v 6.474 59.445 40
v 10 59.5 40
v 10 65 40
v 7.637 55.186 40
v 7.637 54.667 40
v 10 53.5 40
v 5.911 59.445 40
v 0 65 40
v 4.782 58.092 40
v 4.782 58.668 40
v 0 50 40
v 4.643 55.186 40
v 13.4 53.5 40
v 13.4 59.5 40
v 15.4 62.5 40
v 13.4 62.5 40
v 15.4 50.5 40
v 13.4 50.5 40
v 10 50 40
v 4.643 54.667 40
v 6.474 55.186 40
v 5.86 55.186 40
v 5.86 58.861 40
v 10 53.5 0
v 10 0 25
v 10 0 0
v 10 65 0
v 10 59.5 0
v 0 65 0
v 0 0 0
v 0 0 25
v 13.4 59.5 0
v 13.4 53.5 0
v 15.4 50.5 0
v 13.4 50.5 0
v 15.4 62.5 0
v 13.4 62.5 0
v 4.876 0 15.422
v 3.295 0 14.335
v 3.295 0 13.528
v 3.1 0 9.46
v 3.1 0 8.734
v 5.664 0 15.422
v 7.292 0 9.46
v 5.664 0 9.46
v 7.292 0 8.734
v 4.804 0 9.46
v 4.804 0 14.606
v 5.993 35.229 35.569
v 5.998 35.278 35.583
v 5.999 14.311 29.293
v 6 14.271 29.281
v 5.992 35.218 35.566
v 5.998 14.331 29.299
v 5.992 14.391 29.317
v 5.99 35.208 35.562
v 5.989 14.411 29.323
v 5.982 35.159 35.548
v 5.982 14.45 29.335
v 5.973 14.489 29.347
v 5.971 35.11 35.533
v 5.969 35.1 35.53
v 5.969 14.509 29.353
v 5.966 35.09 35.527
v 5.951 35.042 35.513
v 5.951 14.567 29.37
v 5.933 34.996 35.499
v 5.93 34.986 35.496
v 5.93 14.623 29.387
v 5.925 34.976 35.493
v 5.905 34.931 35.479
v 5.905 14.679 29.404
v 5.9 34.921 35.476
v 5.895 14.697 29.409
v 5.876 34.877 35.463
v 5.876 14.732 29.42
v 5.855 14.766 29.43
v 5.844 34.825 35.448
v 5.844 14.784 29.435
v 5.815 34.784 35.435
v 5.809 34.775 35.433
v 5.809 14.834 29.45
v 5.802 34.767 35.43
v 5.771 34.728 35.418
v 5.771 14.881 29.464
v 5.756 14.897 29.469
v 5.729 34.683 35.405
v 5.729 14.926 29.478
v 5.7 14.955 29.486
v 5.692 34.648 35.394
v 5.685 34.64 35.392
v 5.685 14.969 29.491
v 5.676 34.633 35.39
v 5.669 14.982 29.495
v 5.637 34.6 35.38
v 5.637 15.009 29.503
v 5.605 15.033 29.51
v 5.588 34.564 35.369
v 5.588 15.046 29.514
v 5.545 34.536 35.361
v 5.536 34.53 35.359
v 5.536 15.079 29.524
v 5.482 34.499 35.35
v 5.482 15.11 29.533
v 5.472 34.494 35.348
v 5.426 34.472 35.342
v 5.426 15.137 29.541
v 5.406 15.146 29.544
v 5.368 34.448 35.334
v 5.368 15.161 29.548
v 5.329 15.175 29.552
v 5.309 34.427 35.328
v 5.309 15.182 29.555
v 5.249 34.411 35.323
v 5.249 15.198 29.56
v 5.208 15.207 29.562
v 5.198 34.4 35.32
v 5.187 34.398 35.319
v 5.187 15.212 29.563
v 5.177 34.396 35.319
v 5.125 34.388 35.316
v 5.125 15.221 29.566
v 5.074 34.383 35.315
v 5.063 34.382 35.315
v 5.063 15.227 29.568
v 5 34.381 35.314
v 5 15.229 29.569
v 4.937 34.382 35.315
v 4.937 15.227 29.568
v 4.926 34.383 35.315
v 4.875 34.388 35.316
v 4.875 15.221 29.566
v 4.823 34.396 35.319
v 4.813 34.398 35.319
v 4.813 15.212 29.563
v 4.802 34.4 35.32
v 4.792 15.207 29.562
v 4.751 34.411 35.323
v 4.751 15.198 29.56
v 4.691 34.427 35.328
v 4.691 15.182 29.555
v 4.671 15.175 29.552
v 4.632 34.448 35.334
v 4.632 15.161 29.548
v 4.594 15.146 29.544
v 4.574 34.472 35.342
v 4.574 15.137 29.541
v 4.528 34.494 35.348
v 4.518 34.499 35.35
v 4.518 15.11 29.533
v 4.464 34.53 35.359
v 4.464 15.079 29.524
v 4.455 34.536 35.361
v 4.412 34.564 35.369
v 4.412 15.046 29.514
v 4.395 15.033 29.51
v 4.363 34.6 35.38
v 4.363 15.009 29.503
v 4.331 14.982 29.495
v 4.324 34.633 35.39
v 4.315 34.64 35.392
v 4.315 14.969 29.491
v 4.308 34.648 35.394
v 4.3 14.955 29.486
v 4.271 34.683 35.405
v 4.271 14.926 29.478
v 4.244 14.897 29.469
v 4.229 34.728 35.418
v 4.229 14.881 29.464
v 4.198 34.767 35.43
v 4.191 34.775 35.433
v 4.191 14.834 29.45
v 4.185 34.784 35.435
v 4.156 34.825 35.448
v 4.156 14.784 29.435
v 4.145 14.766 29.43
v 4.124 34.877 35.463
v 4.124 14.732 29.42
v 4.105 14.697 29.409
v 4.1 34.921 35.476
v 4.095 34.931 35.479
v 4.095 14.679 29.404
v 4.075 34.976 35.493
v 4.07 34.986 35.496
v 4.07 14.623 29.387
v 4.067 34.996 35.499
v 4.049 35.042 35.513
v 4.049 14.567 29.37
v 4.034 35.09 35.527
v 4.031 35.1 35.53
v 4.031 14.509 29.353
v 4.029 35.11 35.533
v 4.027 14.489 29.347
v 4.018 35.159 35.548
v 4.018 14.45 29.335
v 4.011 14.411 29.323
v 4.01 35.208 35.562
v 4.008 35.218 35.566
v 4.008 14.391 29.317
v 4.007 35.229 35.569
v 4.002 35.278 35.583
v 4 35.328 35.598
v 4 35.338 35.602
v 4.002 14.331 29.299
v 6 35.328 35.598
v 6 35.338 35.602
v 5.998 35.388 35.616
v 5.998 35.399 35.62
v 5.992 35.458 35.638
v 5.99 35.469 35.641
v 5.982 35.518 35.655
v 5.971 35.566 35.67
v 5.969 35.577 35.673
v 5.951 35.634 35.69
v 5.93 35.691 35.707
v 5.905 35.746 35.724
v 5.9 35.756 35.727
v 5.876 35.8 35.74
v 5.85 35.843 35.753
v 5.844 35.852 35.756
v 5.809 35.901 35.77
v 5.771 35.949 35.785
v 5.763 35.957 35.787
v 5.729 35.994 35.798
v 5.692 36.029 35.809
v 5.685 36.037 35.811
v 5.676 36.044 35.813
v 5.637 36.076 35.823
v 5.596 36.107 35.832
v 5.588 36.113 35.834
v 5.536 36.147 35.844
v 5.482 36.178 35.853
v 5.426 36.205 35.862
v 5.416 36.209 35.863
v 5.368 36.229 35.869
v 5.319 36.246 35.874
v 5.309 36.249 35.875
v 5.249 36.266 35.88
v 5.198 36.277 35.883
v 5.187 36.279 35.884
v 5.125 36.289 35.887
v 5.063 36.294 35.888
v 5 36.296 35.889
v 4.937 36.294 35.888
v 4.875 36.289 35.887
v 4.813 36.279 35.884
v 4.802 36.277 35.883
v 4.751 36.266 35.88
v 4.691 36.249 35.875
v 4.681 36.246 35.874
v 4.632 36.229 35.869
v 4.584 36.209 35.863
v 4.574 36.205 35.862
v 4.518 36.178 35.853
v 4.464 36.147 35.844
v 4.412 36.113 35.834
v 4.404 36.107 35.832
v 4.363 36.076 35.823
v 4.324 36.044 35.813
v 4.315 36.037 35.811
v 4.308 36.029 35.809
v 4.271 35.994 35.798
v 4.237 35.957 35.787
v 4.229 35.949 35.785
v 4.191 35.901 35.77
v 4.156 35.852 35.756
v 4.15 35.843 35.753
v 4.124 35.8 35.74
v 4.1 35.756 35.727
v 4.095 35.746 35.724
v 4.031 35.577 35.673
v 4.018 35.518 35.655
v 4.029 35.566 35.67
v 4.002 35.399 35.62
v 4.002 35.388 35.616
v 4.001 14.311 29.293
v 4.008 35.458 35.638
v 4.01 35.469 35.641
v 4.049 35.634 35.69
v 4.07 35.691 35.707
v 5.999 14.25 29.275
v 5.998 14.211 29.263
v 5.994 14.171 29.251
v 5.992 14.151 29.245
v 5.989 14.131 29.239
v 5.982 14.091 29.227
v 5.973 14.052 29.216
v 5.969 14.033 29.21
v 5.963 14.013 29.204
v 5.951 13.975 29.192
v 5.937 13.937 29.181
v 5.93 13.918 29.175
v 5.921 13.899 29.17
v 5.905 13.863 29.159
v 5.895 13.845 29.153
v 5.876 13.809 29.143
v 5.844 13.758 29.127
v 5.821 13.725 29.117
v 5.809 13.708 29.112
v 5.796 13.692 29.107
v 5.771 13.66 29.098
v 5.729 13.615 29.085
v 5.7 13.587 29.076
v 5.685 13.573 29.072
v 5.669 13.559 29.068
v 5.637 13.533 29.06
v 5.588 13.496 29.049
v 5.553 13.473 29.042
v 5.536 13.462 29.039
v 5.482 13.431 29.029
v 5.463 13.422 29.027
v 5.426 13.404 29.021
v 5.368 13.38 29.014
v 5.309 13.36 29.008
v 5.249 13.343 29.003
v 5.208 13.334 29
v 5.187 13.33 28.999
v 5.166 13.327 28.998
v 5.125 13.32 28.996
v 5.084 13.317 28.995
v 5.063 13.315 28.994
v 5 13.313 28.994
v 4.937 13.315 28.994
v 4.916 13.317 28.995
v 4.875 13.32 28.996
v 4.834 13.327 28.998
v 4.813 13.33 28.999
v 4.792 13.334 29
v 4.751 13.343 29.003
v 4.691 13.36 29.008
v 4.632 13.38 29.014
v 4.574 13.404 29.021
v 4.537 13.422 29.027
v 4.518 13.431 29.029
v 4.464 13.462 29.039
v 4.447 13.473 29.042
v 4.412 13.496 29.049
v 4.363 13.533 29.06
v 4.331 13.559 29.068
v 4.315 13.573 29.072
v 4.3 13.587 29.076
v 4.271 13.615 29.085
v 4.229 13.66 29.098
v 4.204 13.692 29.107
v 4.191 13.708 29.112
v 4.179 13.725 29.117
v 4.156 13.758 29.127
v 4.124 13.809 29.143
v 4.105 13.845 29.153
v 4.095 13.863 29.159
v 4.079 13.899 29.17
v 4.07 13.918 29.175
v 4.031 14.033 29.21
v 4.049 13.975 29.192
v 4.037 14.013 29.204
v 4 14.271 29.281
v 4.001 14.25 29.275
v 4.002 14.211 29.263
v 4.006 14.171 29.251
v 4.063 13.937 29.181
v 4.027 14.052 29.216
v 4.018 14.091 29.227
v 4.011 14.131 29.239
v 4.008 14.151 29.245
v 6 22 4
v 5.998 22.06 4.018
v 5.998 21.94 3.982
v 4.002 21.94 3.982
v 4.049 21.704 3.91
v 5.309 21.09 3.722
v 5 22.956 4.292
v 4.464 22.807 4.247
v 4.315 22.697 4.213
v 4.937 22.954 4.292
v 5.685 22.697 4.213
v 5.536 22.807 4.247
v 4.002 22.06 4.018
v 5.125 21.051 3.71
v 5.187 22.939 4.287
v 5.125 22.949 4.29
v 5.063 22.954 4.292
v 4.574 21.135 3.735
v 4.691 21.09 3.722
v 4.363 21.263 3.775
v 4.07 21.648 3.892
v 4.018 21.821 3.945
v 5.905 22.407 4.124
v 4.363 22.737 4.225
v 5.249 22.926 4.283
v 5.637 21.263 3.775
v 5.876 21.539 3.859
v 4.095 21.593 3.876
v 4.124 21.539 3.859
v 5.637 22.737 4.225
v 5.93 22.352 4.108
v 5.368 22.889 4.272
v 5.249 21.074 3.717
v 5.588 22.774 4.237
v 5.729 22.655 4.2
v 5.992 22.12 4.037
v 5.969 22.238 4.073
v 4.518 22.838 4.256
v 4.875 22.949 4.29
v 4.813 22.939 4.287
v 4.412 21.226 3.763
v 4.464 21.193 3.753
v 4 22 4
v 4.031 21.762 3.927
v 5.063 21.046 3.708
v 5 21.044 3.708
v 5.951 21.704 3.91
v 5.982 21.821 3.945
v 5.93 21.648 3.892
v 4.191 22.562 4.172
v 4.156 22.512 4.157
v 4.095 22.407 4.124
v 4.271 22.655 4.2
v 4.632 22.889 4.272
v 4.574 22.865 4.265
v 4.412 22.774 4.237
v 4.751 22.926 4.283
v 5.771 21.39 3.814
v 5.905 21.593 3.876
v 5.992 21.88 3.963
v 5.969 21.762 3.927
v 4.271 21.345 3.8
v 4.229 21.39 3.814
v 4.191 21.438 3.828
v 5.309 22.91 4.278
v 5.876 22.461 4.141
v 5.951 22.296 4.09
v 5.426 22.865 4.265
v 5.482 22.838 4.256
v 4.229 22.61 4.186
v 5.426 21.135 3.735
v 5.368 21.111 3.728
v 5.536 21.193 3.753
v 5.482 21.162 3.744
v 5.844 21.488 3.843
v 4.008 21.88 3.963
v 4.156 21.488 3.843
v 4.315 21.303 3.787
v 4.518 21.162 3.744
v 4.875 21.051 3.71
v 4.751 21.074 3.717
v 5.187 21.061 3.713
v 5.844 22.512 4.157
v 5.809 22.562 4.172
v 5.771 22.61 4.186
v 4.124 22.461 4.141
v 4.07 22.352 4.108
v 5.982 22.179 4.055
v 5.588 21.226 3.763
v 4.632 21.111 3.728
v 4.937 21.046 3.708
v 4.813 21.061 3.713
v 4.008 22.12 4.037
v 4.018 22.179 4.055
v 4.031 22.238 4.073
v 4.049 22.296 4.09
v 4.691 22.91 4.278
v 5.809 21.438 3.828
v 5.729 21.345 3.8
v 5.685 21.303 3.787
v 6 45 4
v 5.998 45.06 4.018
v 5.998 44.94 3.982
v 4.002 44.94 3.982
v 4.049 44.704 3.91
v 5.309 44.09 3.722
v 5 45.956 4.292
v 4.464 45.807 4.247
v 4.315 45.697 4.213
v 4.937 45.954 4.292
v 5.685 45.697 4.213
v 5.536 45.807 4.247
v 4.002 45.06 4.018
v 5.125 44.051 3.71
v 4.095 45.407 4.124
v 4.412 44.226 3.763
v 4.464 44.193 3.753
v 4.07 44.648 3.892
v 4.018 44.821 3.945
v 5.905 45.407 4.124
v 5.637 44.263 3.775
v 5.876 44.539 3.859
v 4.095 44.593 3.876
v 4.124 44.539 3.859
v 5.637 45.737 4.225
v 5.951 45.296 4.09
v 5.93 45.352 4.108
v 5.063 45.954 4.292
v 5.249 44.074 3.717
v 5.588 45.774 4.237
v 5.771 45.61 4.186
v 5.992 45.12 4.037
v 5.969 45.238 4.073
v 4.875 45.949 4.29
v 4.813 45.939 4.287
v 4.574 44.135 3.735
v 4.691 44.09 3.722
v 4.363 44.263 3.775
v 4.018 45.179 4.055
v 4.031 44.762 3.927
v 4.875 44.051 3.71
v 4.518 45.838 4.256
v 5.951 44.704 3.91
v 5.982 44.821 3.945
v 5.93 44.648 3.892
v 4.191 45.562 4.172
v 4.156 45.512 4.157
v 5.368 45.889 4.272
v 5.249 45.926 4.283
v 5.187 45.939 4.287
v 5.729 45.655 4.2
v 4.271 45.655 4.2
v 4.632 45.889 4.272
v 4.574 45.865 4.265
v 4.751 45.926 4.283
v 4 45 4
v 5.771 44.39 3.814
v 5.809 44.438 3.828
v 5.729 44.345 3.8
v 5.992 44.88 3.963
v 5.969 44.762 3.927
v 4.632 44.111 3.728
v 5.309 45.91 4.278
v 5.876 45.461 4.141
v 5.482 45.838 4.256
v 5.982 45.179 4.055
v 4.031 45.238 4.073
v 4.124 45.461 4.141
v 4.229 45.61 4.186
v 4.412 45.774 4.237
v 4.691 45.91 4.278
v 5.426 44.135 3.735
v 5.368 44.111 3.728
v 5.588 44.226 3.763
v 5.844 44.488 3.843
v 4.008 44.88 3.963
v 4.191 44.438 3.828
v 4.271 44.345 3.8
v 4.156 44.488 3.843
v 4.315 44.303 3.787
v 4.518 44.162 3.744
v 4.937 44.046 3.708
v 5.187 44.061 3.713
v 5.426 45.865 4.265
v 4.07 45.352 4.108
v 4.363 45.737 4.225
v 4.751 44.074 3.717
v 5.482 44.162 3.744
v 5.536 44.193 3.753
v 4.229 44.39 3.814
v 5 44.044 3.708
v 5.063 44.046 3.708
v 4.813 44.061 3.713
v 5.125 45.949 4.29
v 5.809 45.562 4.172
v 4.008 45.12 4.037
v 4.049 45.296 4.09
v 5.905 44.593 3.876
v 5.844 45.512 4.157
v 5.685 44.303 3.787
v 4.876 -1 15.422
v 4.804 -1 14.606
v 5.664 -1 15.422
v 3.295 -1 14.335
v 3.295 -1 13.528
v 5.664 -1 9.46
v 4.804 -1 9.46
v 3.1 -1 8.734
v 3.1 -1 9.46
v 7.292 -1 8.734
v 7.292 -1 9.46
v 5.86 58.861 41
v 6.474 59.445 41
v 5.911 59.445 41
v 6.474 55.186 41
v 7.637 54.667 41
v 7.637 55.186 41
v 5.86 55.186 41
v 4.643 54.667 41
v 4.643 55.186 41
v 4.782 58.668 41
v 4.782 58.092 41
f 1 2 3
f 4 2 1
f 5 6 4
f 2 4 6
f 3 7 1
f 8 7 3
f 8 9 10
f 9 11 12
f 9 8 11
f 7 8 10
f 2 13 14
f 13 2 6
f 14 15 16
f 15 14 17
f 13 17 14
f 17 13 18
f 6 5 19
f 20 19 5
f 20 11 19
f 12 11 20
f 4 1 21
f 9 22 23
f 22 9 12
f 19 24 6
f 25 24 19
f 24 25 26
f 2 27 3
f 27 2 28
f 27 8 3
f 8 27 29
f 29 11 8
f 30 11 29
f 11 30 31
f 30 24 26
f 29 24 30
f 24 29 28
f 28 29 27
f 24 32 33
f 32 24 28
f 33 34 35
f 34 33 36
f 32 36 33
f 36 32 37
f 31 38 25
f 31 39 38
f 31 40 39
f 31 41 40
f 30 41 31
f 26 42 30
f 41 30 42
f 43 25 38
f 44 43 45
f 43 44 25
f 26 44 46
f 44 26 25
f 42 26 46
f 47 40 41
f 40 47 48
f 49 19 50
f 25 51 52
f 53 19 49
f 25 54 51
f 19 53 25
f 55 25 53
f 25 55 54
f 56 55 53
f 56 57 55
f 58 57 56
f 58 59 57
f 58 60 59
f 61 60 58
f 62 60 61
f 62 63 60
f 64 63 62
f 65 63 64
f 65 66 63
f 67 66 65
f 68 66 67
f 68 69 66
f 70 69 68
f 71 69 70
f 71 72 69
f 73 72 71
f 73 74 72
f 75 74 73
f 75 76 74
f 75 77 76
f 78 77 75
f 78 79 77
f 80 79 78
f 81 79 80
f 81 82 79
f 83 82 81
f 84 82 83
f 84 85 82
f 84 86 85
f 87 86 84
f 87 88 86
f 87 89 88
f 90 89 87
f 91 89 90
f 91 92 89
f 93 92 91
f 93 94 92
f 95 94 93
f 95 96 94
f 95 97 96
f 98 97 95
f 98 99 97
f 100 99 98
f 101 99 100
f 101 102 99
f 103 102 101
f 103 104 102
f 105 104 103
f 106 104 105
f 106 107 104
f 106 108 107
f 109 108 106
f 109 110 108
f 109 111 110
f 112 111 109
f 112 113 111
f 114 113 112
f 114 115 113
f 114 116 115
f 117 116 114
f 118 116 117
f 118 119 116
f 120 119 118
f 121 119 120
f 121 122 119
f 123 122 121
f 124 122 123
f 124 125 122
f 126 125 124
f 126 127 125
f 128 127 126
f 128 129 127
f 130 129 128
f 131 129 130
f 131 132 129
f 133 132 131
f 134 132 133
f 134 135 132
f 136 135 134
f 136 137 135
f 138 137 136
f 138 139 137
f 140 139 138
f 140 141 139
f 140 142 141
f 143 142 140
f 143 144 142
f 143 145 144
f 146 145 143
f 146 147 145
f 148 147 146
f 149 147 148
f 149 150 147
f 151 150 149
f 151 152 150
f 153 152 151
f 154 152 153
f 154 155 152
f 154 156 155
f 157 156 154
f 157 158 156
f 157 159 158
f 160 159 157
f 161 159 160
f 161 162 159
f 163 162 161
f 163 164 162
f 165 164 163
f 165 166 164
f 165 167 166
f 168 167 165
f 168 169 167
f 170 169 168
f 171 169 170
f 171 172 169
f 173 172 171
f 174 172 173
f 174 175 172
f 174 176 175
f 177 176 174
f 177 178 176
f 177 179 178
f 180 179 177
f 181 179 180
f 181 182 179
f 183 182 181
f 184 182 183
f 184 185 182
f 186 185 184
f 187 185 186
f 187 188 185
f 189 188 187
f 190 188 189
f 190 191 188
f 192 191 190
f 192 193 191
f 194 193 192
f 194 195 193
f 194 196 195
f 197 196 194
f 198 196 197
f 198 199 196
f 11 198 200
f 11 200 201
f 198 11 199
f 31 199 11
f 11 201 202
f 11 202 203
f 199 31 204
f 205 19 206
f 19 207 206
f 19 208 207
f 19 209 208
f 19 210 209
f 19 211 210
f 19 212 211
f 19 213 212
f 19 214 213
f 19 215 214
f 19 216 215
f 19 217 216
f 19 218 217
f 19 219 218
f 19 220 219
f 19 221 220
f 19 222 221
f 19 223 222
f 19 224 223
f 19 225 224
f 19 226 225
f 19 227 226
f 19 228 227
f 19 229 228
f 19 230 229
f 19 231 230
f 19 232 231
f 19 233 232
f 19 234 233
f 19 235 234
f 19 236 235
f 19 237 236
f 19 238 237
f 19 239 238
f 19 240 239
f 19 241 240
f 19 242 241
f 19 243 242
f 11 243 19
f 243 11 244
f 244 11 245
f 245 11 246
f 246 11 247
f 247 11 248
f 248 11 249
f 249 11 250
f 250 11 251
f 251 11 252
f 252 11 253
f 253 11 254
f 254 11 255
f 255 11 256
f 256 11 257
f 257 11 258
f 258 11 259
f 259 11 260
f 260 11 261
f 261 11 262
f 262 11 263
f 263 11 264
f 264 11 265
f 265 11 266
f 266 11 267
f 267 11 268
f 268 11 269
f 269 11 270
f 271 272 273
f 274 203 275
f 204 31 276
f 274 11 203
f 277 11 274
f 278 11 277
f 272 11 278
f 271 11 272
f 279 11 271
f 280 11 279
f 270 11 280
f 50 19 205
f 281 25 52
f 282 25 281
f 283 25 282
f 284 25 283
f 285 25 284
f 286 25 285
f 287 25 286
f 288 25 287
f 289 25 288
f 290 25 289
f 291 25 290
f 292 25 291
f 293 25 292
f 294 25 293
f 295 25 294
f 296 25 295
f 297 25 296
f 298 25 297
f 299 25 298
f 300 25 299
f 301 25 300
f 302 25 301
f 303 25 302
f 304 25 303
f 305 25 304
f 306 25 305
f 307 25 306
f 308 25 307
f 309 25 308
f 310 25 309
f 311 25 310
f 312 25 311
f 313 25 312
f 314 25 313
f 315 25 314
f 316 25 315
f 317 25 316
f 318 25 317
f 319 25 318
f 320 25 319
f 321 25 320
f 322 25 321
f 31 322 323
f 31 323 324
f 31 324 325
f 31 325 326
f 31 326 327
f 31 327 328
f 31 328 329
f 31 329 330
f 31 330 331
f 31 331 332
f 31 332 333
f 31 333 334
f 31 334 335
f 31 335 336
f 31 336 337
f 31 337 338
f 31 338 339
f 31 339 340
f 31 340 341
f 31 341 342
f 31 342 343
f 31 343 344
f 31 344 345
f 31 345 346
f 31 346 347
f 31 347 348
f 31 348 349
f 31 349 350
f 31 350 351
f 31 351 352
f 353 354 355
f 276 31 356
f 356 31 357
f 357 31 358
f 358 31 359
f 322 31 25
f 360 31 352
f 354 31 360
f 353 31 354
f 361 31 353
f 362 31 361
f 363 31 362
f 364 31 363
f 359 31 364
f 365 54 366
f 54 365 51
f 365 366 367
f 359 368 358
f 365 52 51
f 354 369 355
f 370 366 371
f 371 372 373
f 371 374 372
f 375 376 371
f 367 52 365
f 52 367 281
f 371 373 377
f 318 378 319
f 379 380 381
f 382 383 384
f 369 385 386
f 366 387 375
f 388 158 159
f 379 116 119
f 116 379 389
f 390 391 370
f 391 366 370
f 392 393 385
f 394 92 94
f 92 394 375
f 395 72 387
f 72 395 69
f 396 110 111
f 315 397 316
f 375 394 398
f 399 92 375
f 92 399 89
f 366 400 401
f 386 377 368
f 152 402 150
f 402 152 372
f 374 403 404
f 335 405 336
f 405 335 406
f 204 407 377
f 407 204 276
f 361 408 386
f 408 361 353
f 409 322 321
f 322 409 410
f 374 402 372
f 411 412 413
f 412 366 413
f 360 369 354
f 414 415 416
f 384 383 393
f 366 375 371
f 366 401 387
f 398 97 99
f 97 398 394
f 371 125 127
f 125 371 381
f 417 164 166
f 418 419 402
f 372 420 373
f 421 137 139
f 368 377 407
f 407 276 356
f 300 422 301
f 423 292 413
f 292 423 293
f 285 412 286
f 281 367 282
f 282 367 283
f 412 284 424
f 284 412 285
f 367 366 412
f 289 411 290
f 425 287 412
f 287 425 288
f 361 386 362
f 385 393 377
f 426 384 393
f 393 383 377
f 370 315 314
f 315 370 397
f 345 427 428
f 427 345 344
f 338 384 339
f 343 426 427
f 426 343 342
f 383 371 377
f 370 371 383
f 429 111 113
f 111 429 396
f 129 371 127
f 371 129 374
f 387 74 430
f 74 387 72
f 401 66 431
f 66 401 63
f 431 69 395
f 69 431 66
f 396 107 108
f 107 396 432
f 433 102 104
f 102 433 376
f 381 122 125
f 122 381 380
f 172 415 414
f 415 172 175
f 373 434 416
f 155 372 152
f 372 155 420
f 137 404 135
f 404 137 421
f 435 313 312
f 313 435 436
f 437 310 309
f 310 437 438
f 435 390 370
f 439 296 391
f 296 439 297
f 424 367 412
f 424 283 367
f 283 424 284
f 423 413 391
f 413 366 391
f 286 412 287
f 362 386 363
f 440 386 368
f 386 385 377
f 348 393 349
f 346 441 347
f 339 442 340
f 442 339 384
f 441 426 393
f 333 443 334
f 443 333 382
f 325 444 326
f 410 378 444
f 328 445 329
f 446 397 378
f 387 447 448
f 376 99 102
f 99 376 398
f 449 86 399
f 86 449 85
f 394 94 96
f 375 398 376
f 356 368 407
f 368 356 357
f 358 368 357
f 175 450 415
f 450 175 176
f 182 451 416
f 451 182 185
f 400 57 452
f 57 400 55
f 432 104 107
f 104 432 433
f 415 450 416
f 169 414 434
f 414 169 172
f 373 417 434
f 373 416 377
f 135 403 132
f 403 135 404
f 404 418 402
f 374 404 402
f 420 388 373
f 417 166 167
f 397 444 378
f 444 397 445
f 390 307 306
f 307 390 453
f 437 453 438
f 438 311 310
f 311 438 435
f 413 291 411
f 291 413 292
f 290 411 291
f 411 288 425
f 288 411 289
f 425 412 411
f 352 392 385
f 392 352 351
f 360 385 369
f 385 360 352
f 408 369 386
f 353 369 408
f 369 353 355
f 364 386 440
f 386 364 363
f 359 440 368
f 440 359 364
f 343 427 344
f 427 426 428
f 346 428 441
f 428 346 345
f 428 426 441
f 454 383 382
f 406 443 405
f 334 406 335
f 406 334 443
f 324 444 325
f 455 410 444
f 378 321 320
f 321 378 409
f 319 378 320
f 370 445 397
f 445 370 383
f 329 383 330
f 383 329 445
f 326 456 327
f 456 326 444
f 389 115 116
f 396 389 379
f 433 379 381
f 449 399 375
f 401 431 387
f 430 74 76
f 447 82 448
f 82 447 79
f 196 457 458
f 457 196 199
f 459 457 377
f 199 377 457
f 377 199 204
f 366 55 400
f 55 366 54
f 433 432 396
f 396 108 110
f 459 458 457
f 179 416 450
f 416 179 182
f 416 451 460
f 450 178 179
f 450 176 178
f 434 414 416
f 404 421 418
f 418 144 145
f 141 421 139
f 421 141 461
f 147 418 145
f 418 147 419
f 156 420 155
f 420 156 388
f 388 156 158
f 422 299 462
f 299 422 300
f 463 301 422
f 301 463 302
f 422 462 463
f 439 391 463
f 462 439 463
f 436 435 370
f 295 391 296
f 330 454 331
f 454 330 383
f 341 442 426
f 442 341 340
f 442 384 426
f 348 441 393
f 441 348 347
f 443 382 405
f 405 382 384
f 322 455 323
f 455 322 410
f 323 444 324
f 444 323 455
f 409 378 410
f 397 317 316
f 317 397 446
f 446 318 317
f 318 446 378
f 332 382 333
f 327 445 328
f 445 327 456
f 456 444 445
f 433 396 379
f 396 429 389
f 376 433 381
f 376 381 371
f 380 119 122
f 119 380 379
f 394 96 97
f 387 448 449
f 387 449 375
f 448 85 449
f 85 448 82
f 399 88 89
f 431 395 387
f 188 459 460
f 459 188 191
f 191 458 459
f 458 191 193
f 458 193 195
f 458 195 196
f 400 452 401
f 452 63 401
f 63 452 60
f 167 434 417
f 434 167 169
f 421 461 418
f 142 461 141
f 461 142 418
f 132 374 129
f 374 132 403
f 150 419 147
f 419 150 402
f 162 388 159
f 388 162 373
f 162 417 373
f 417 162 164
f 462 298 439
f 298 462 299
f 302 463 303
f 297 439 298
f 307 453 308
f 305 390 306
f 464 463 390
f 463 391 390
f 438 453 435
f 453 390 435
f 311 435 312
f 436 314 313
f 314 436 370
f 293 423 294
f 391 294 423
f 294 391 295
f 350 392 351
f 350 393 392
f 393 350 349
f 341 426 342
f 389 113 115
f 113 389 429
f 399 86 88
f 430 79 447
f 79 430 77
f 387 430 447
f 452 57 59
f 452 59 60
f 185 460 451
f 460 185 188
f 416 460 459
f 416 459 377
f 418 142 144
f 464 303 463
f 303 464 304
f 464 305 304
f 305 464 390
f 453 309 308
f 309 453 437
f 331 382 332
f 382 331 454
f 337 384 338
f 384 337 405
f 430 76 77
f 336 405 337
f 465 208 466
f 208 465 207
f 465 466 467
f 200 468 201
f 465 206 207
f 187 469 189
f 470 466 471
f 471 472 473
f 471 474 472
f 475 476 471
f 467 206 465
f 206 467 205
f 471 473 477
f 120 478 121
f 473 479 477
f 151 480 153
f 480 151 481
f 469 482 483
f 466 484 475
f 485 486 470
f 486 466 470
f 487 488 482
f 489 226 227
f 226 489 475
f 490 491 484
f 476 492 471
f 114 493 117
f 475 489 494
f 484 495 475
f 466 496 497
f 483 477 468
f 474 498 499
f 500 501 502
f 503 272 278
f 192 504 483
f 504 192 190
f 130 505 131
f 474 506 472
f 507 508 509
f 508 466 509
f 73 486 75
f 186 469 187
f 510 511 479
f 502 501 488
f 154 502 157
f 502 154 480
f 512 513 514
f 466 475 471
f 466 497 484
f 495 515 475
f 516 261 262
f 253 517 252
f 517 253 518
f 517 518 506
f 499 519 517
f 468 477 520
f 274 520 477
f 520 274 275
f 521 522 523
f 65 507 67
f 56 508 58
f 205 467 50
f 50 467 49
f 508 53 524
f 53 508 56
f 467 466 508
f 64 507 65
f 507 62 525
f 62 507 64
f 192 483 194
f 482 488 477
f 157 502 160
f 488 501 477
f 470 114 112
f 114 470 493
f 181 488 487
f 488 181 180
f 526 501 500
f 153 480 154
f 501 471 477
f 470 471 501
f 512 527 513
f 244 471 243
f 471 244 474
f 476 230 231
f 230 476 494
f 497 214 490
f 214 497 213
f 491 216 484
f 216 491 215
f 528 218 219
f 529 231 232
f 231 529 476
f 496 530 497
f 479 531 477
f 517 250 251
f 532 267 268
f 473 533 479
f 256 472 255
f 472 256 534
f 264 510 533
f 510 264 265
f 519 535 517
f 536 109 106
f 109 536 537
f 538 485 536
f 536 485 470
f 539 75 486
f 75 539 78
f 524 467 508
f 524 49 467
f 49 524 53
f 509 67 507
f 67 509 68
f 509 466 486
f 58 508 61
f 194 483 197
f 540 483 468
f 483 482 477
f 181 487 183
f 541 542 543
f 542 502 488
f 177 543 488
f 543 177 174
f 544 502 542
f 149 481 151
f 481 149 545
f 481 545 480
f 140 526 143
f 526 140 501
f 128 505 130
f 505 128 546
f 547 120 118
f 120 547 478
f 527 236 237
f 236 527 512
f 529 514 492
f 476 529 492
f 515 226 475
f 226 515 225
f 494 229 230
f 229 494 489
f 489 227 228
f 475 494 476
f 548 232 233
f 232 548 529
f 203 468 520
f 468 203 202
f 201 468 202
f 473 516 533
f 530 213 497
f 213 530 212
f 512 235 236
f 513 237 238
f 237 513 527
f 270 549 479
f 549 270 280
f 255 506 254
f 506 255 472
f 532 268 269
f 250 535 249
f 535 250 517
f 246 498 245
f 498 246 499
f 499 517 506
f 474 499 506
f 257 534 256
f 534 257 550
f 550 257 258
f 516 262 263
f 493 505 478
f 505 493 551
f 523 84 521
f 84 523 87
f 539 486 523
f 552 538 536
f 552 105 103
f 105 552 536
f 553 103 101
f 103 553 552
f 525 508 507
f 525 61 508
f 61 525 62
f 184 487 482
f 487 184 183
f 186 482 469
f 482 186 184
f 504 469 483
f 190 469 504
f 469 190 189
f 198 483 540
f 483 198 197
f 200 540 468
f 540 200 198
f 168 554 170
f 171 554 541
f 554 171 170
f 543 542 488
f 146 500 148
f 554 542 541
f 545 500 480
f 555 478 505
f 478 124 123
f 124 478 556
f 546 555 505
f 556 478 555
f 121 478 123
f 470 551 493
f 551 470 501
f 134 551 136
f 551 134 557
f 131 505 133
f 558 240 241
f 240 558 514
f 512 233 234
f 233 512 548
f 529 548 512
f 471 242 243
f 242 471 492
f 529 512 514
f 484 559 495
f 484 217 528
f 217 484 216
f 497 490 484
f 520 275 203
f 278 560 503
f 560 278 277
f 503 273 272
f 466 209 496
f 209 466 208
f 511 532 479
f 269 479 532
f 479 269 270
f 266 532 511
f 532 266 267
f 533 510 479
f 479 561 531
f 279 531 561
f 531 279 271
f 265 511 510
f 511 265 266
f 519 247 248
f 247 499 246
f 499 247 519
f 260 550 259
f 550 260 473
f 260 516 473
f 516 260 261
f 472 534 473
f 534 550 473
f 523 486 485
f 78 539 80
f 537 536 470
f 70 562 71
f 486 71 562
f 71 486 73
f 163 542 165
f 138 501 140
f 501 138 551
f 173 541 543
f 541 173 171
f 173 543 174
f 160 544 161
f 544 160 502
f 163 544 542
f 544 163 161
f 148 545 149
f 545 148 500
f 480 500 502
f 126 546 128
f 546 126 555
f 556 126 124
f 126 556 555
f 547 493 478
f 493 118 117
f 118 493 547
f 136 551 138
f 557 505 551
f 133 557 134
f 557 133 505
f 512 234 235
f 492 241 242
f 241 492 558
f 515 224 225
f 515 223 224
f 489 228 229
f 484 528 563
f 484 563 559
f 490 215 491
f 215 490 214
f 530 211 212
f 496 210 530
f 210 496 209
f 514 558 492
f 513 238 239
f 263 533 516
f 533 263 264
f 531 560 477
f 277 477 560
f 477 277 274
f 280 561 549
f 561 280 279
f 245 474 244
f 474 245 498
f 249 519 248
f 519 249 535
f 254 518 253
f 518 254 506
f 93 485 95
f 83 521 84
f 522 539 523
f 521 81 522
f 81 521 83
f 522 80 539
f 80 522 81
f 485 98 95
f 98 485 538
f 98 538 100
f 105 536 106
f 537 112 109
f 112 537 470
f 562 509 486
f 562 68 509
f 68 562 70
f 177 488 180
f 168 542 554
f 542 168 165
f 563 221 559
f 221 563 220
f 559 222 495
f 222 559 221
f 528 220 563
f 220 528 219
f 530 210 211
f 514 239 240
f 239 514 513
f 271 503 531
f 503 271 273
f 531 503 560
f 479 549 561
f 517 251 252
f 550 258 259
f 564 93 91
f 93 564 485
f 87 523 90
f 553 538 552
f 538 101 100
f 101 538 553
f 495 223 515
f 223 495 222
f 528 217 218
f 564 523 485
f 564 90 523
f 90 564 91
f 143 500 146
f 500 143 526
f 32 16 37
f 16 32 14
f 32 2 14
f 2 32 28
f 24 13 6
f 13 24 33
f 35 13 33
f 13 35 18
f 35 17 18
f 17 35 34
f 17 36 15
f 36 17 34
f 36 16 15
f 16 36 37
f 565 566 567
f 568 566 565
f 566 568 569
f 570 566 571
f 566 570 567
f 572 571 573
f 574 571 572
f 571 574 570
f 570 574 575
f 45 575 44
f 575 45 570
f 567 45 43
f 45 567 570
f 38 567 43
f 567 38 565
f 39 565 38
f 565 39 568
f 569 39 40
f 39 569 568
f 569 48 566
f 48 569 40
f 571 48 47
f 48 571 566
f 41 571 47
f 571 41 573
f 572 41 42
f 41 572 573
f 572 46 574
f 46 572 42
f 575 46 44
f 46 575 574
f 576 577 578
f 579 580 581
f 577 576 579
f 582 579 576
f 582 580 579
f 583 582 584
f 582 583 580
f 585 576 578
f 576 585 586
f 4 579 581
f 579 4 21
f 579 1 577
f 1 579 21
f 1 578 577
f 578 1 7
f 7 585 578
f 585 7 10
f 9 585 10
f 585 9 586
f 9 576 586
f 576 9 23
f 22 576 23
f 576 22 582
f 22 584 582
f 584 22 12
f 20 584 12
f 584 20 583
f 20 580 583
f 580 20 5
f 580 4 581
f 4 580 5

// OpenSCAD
$fn = 100;

// The overall depth
_dh_depth = 65;
// The overall height (plus number)
_dh_height = 40; 
// Teh font used for the numbers
_font = ("Arial");


module notch(height, reduction) {

    r = reduction;
    linear_extrude(height = height)
    translate([0, 0, 0])
    polygon(points=[
        [r, r], 
        [13-r, r],
        [13-r, 3-r],
        [10-r, 3-r],
        [10-r, 6-r+r],
        [3+r, 6-r+r],
        [3+r, 3-r],
        [r, 3-r] 
        ],convexity=1
    );
}

// dd = Drill diameter
// ibs = in between size
module drill_holder(dd, ibs) {

    _dh_drill_dia = dd;
    _dh_width = _dh_drill_dia + 9;
    _dh_hole_tolerance = 0.5;

    // The base form of the corpus
    difference() {
        rotate([0,90,0])
        linear_extrude(height = _dh_width)
            translate([0, 0, 0])
            polygon(points=[
                [0, 0], 
                [- _dh_height + 15, 0],
                [- _dh_height, _dh_depth - 15],
                [- _dh_height, _dh_depth],
                [0, _dh_depth] 
                ],convexity=10
            );

        // Front hole
        color("red")
        translate([_dh_width / 2, 22, 4])
        rotate([17, 0, 0])
        cylinder(h = _dh_height, r = _dh_drill_dia / 2 + _dh_hole_tolerance);

        // Back hole
        color("red")
        translate([_dh_width / 2, _dh_depth - 20, 4])
        rotate([17, 0, 0])
        cylinder(h = _dh_height, r = _dh_drill_dia / 2 + _dh_hole_tolerance);

        // Notch cutout
        // color("red")
        // translate([6 - 0.2, _dh_depth - 15, -1])
        // rotate([0, 0, 90])
        // notch(_dh_height + 2, 0);

    }

    // Notch
    color("cyan")
    translate([_dh_width + 6 - 0.1, _dh_depth - 15, 0])
    rotate([0, 0, 90])
    notch(_dh_height, 0.5);

    
    _dh_label = ibs == 0 ? str(dd) : str(dd,".5");

    // Front number
    color("black")
    translate([_dh_width / 2, 0, _dh_height / 2 - 8])
    rotate([90,0,0])
    linear_extrude(1)
    text(halign = "center", valign = "center", text = _dh_label, font = _font, size = 7);

    // Back number
    color("black")
    translate([_dh_width / 2 + 1, _dh_depth -8, _dh_height])
    rotate([0,0,0])
    linear_extrude(1)
    text(halign = "center", valign = "center", text = _dh_label, font = _font, size = 5);
}

drill_holder(1, 0);

// difference() {
//     drill_holder(12.5, 0);

//     translate([-1, -1, -1])
//     cube([30, 45, 50]);
// }

// difference() {
//     cube([20,20,20]);

//     color("red")
//     translate([14.1, 18, -1])
//     rotate([0, 0, 270])
//     notch(22, 0);
// }


// color("green")
// translate([-6, 18, 0])
// rotate([0, 0, 270])
// notch(20, 0.4);

// color("red")
// notch(1, 0.5);

// translate([0,0,1])
// notch(1,0);
